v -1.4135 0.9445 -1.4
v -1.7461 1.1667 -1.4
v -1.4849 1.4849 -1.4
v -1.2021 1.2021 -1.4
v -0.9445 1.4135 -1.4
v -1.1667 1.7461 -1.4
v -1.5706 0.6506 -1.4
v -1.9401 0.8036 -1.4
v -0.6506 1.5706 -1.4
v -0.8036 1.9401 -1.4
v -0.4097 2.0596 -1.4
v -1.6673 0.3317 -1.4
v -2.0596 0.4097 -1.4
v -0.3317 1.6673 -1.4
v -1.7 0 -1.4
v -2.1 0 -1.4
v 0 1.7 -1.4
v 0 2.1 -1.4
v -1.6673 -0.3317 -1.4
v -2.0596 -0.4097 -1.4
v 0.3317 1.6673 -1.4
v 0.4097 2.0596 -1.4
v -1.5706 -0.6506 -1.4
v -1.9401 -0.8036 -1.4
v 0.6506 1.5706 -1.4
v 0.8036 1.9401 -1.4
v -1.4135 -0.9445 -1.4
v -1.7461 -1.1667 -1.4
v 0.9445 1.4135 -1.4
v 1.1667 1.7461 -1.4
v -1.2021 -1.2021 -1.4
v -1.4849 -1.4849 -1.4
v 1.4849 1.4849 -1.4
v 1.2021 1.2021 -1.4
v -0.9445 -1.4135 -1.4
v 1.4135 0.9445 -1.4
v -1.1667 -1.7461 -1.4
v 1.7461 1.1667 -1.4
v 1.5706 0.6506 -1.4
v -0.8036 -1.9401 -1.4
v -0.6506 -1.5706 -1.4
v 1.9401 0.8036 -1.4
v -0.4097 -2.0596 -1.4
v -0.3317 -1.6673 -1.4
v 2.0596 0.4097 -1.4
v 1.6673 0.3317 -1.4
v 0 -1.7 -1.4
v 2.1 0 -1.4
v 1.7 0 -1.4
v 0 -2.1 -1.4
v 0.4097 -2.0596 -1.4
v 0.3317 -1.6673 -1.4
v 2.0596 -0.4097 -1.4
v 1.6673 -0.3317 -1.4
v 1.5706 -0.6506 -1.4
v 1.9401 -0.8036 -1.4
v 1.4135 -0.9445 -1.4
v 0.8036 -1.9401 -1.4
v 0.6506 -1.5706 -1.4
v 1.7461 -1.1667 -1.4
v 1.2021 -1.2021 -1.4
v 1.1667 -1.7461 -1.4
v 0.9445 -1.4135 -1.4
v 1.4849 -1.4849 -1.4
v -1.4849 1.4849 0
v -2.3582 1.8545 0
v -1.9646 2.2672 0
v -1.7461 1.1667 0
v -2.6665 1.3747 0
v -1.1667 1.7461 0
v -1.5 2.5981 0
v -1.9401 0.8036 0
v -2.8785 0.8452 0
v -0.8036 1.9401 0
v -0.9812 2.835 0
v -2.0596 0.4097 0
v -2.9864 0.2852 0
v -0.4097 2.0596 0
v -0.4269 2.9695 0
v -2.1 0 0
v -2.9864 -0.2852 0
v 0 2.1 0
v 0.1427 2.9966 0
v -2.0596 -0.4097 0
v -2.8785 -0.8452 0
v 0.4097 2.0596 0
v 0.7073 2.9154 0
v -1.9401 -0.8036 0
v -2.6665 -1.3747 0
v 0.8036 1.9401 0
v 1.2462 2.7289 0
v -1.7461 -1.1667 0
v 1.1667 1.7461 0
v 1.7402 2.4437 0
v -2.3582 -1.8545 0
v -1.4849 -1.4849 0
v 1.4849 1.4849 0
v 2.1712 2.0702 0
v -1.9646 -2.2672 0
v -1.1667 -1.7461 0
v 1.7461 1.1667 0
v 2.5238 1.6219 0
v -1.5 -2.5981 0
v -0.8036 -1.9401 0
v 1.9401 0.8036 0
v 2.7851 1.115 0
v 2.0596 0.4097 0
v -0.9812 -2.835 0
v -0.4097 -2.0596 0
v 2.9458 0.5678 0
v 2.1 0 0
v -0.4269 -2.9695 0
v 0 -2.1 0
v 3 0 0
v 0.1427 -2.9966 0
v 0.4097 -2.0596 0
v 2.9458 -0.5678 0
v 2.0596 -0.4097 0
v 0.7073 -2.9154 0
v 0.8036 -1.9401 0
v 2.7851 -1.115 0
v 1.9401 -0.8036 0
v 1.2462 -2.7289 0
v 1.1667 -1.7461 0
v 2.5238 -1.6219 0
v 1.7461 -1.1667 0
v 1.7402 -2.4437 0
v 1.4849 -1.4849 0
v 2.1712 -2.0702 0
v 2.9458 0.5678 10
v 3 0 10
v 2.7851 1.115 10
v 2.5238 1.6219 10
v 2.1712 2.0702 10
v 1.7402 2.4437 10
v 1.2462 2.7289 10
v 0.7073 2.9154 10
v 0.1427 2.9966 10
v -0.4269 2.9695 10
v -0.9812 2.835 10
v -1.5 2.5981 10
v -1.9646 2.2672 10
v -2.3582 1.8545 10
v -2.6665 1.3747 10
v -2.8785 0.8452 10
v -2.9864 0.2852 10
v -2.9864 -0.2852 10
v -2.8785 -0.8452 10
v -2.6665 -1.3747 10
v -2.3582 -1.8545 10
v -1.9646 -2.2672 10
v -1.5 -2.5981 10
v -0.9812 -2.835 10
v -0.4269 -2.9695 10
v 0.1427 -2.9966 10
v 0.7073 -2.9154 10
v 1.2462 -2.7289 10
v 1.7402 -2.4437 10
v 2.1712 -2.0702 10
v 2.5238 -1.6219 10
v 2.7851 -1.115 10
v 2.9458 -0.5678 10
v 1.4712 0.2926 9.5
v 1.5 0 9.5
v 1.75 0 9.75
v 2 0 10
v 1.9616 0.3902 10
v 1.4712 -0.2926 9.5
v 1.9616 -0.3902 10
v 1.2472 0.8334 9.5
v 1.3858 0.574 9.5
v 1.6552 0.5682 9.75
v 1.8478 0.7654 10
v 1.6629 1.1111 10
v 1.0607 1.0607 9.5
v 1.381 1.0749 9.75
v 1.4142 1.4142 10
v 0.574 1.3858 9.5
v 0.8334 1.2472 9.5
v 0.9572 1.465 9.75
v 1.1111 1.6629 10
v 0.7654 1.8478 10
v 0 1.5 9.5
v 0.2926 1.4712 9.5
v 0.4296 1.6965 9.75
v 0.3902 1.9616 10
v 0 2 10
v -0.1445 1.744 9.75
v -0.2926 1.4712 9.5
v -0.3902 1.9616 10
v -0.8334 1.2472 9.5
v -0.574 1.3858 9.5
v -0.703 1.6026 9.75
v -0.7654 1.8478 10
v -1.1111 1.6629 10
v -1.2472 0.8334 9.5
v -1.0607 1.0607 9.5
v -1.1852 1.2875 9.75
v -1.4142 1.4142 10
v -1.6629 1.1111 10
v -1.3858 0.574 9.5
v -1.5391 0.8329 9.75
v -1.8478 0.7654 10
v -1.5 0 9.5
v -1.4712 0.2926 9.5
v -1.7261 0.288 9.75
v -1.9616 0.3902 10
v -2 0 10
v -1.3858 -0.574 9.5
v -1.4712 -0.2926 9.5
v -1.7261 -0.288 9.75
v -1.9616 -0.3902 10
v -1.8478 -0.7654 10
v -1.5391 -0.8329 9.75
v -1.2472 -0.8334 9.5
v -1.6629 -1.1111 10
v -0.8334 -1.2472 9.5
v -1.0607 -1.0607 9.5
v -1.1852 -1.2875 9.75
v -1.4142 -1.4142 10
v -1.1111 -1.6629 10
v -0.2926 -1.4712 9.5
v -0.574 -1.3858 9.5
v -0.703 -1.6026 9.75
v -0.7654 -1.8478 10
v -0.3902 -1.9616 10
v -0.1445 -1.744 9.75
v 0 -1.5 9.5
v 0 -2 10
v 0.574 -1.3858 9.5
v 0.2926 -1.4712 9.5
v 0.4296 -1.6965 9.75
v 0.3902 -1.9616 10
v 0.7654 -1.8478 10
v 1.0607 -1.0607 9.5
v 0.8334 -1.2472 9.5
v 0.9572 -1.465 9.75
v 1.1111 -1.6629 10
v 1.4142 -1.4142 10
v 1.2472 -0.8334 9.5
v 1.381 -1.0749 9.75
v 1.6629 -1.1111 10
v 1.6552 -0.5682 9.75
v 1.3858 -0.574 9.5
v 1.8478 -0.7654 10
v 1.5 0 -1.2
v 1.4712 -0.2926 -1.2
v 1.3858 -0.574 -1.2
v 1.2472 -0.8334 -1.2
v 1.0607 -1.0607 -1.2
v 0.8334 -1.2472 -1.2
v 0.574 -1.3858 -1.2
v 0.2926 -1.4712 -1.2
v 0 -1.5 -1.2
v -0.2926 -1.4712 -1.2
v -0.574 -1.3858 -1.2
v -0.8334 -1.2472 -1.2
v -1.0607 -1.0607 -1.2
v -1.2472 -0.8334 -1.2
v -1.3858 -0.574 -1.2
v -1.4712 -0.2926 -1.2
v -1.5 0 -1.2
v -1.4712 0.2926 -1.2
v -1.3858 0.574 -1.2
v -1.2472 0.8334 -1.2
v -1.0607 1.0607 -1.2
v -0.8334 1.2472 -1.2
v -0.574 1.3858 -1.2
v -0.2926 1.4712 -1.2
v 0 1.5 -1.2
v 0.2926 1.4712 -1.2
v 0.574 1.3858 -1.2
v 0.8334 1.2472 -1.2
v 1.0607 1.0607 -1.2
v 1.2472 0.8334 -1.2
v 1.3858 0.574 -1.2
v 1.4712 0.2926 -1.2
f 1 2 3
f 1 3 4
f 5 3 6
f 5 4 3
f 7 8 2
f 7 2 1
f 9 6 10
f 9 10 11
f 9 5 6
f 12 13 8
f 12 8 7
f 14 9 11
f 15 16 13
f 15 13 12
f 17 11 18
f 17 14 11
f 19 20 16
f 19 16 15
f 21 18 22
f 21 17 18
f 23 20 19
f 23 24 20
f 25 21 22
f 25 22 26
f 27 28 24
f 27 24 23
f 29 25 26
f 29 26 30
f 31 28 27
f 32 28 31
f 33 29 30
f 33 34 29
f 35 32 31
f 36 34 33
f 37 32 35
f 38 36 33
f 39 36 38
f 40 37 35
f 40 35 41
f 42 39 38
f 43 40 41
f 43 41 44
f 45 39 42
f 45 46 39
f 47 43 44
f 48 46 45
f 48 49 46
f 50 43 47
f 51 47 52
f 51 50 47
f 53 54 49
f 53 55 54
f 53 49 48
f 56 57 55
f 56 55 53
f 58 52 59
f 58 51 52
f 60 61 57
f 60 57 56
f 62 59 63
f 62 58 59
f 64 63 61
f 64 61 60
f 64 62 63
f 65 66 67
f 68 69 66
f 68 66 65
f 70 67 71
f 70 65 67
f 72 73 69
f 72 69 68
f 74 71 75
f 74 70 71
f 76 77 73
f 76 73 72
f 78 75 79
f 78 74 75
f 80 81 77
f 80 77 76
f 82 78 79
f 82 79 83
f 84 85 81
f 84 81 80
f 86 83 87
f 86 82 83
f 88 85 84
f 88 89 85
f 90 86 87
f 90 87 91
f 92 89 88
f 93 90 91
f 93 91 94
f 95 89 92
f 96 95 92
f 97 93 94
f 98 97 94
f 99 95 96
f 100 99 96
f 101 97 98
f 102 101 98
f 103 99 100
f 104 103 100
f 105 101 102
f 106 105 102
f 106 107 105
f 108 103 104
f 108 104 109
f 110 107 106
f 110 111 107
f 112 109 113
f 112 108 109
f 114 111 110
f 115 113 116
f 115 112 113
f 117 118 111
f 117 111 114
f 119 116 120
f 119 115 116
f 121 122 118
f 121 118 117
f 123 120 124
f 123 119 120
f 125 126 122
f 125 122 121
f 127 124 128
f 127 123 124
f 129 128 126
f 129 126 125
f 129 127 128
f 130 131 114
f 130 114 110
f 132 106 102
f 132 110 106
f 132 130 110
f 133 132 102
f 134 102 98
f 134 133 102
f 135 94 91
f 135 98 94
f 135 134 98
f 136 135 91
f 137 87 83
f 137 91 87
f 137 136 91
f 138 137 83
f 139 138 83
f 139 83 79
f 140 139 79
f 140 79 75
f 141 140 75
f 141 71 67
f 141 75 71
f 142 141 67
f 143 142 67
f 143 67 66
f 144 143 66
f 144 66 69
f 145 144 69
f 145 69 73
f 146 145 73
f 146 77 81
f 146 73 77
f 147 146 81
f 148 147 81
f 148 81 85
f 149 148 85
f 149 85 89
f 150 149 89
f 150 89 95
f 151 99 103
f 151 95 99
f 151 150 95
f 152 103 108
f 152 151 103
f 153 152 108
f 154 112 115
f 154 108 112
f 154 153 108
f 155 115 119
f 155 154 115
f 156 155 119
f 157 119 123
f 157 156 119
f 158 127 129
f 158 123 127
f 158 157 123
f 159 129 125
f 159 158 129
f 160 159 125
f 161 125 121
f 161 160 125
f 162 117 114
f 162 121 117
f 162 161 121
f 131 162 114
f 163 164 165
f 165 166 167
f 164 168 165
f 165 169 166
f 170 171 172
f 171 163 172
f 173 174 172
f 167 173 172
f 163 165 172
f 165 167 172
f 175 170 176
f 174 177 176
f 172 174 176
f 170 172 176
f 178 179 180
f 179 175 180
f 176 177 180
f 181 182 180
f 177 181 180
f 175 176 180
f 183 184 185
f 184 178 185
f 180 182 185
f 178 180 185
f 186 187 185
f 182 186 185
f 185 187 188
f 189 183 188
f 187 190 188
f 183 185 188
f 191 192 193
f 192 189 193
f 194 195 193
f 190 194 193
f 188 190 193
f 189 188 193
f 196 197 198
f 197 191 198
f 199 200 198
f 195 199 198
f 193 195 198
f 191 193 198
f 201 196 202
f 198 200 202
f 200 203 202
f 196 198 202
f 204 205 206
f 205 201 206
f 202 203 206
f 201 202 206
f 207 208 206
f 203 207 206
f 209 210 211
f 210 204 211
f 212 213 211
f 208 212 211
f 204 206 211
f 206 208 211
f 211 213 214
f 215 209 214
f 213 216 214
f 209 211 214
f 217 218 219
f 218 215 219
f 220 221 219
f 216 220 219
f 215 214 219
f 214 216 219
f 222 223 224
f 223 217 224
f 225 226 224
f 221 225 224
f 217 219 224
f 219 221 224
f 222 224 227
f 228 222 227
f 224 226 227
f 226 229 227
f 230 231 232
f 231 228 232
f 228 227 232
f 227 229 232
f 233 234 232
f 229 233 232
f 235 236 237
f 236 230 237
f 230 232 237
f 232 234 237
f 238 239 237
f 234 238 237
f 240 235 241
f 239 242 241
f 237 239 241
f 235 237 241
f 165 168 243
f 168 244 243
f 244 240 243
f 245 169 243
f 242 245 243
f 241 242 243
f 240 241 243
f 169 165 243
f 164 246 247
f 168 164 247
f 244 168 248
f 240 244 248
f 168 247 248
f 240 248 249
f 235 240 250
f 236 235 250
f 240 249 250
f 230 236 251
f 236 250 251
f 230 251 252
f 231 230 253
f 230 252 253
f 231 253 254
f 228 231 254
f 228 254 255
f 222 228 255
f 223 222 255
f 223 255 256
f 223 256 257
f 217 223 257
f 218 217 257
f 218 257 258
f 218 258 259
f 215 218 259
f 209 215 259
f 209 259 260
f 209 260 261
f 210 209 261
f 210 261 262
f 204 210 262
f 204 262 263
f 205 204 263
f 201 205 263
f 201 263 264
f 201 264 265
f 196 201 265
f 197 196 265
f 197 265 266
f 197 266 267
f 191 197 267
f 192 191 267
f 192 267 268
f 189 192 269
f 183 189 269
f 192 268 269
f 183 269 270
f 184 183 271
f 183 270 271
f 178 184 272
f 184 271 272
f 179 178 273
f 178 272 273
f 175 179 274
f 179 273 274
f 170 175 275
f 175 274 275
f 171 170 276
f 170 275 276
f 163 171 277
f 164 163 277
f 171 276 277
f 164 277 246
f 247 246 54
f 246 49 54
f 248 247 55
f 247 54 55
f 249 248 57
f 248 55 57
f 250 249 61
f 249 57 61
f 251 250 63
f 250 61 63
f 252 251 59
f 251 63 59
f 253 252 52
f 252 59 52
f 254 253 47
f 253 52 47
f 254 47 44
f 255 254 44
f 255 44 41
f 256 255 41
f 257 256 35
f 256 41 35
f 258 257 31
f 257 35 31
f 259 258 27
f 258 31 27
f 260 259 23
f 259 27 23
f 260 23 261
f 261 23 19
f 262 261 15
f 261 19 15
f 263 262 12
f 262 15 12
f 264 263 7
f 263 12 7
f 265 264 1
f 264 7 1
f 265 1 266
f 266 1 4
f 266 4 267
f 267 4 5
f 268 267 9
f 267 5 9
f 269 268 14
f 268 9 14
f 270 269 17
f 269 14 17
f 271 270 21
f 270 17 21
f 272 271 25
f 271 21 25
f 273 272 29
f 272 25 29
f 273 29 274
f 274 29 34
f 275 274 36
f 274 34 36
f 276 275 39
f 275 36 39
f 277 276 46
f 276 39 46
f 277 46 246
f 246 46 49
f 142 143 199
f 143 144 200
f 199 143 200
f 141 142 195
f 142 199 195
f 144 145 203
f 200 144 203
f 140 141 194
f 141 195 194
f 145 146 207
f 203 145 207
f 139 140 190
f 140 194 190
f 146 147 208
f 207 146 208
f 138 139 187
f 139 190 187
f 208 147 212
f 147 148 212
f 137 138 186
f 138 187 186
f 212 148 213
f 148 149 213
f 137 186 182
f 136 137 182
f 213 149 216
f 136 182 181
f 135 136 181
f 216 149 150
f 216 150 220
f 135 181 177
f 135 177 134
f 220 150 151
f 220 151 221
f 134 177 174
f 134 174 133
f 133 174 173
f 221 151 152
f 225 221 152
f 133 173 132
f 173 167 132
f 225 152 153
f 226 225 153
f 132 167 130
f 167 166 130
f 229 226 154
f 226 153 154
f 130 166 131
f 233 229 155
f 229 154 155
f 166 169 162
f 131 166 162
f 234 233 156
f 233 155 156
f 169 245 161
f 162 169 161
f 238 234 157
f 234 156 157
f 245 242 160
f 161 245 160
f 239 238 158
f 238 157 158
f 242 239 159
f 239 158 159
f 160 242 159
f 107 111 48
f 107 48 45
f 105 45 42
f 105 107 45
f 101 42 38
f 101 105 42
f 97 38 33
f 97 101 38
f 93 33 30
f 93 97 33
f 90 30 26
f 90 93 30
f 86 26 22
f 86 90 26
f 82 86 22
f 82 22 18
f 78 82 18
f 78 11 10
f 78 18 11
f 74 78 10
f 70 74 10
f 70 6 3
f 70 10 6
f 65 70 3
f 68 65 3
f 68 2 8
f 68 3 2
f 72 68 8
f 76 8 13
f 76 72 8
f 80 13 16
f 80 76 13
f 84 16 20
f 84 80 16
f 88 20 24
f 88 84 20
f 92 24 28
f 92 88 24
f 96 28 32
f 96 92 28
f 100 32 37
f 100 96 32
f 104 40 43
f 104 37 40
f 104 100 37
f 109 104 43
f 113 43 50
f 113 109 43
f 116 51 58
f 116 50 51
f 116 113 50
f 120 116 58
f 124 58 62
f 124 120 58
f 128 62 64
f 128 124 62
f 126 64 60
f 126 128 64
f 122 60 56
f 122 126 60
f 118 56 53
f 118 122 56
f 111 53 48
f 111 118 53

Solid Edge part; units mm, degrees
sketch "Sketch1" plane through (0, 0, 0) normal (0, -1, 0) x (1, 0, 0)
  line L0 (1.7, -1.4) -> (2.1, -1.4)
  line L1 (2.1, -1.4) -> (2.1, 0)
  line L2 (2.1, 0) -> (3, 0)
  line L3 (3, 0) -> (3, 10)
  line L4 (3, 10) -> (2, 10)
  line L5 (2, 10) -> (1.5, 9.5)
  line L6 (1.5, 9.5) -> (1.5, -1.2)
  line L7 (1.7, -1.4) -> (1.5, -1.2)
  dimension "D1" = 10
  dimension "D2" = 1.5
  dimension "D3" = 2.1
  dimension "D4" = 3
  dimension "D5" = 0.5
  dimension "D6" = 1.4
  dimension "D7" = 0.2
revolve "RevolvedProtrusion1" add sketch "Sketch1" angle 360 about axis through (0, 0, 54) along (0, 0, -1)
